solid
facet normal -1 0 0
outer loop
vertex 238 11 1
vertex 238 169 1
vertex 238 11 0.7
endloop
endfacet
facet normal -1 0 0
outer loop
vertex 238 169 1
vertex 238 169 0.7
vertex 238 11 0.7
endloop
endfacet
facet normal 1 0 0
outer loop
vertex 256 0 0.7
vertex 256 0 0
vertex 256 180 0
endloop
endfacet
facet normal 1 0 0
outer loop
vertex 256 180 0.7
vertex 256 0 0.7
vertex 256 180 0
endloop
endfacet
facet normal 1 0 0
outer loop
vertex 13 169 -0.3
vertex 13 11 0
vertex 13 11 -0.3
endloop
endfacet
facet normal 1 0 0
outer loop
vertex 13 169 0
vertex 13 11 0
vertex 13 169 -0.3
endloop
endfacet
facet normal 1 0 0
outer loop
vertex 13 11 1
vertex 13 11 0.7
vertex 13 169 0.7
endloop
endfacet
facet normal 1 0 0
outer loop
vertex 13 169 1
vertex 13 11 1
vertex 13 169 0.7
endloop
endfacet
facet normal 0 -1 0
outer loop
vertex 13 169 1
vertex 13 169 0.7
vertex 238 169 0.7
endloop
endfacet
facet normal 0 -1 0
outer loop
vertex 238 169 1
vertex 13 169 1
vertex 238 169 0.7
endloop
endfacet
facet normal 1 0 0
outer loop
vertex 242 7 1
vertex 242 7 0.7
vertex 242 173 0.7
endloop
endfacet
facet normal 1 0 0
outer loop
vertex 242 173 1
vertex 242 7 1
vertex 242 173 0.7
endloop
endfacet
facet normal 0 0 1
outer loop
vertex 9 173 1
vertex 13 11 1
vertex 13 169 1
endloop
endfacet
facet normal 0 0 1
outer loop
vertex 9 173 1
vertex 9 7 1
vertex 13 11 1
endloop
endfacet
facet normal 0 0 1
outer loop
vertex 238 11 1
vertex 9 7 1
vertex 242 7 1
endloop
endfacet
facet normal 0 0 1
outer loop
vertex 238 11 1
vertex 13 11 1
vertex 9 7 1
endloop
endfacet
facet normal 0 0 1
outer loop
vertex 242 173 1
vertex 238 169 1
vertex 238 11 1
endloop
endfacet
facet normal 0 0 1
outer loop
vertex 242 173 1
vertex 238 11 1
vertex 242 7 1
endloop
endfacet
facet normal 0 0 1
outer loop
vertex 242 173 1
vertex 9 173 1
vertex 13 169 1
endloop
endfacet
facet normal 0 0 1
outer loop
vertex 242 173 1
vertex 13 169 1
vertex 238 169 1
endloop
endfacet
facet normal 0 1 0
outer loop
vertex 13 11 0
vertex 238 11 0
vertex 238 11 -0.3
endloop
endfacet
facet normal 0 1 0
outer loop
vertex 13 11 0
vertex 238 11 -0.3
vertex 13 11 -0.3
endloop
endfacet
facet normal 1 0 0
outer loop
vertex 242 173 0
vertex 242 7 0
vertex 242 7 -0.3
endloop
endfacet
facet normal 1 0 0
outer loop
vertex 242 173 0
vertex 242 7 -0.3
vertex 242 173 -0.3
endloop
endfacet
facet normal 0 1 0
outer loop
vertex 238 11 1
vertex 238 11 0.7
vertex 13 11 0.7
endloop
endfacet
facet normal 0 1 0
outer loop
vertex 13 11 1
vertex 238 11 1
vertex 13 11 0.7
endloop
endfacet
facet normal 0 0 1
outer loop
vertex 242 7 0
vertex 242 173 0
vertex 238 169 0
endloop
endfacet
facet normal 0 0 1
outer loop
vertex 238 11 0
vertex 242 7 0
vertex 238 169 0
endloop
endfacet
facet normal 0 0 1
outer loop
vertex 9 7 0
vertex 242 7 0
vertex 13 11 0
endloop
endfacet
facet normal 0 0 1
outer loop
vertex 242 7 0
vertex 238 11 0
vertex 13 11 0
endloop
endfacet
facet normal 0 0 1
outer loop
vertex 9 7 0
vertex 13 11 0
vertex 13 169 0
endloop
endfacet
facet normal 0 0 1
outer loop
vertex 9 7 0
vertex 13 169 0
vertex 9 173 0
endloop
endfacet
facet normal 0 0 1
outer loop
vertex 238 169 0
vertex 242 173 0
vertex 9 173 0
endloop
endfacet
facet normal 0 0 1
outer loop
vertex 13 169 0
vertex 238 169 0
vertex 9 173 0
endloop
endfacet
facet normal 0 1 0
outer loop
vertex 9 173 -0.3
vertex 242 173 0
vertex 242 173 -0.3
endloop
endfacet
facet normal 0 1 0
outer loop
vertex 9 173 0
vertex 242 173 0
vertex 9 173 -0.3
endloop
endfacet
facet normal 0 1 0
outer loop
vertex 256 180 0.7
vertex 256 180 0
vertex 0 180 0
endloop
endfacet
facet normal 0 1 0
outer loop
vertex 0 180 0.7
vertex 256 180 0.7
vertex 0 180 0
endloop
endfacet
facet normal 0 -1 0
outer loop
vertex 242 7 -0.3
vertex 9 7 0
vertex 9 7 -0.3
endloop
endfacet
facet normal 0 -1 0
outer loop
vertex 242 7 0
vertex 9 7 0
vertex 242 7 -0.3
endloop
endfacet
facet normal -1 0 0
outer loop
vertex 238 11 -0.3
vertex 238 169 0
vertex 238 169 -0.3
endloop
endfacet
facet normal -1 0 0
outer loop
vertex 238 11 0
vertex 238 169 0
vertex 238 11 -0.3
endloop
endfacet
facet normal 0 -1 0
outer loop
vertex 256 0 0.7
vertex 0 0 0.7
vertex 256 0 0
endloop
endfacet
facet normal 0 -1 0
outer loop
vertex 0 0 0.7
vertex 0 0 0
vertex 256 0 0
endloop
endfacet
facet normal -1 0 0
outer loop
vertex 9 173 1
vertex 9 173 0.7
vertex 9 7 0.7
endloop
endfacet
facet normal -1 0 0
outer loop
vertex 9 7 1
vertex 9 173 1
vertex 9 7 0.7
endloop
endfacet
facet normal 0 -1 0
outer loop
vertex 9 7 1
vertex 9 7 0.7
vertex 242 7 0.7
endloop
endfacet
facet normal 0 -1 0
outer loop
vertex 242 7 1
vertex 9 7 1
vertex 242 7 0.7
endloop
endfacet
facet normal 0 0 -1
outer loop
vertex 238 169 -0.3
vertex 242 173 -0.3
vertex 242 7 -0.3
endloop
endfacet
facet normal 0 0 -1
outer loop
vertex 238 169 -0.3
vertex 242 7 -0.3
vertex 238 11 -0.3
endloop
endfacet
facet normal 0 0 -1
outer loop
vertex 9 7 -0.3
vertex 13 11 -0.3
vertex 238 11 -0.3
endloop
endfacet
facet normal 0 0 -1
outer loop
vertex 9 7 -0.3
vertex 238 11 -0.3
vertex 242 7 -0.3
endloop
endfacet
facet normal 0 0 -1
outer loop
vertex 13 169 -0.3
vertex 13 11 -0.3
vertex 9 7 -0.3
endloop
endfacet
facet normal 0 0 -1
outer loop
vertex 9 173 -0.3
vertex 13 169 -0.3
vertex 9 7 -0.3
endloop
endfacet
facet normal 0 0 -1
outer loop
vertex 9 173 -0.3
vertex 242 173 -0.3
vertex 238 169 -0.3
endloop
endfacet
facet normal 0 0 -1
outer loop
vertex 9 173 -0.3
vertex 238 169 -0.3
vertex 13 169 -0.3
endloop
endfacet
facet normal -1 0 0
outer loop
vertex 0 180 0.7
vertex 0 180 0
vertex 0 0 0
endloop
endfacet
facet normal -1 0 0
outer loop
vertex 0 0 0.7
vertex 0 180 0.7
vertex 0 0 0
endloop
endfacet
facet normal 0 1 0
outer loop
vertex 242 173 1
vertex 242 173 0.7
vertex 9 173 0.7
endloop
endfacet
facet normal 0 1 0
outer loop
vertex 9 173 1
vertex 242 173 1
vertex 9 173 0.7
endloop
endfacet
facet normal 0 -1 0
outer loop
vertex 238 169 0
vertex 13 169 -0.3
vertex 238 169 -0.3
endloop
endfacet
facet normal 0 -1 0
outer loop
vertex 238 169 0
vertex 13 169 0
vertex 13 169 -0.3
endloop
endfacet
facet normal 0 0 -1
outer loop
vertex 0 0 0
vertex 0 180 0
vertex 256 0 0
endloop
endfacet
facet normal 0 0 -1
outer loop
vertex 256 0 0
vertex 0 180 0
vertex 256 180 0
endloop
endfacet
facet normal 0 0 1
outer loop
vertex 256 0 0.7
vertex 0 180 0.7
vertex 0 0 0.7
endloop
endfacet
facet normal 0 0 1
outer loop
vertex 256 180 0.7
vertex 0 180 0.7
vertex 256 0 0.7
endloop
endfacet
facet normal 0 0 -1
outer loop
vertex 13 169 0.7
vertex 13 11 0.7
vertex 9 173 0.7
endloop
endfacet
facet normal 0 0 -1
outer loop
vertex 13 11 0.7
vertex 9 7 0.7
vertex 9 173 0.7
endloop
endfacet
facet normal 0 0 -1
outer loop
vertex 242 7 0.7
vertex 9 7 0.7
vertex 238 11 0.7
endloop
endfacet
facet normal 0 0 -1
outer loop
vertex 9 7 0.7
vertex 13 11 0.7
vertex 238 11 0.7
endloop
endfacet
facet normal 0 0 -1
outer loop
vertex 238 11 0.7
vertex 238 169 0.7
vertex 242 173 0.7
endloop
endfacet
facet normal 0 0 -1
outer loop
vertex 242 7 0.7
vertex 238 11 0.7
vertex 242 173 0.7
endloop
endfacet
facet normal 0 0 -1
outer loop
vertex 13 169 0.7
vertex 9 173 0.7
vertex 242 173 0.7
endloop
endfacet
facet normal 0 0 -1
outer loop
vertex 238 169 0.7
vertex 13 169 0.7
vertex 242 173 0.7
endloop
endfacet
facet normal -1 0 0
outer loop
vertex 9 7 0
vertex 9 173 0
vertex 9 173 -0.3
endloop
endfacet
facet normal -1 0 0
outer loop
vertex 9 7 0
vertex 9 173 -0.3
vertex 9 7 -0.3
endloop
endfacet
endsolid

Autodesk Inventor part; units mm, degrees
ref_plane "YZ Plane" through (0, 0, 0) normal (1, 0, 0) x (0, 1, 0)
ref_plane "XZ Plane" through (0, 0, 0) normal (0, 1, 0) x (-1, 0, 0)
ref_plane "XY Plane" through (0, 0, 0) normal (0, 0, 1) x (1, 0, 0)
sketch "Magnifier_Sketch" plane through (0, 0, 0) normal (0, 0, 1) x (1, 0, 0)
  line L0 (0, 0) -> (256, 0)
  line L1 (256, 0) -> (256, 180)
  line L2 (256, 180) -> (0, 180)
  line L3 (0, 180) -> (0, 0)
  dimension "d0" = 180
  dimension "d1" = 256
extrude "Magnifier_Extrusion" add sketch "Magnifier_Sketch" along normal blind 0.7
sketch "FrontLine_Sketch" plane through (0, 0, 0.7) normal (0, 0, 1) x (1, 0, 0)
  line L0 (242, 173) -> (9, 173)
  line L1 (9, 173) -> (9, 7)
  line L2 (9, 7) -> (242, 7)
  line L3 (242, 7) -> (242, 173)
  line L4 (0, 180) -> (0, 0) projected
  line L5 (256, 180) -> (0, 180) projected
  line L6 (256, 0) -> (256, 180) projected
  line L7 (0, 0) -> (256, 0) projected
  line L8 (13, 11) -> (13, 169)
  line L9 (13, 169) -> (238, 169)
  line L10 (238, 169) -> (238, 11)
  line L11 (238, 11) -> (13, 11)
  dimension "d4" = 9
  dimension "d5" = 7
  dimension "d6" = 14
  dimension "d7" = 7
  dimension "d9" = 4
extrude "FrontLine_Extrusion" add sketch "FrontLine_Sketch" along normal blind 0.3 separate body contours L3 L2 L1 L0
sketch "BackLine_Sketch" plane through (0, 0, 0) normal (0, 0, -1) x (-1, 0, 0)
  line L0 (-13, 169) -> (-238, 169) projected
  line L1 (-238, 169) -> (-238, 11) projected
  line L2 (-238, 11) -> (-13, 11) projected
  line L3 (-13, 11) -> (-13, 169) projected
  line L4 (-242, 173) -> (-9, 173) projected
  line L5 (-9, 173) -> (-9, 7) projected
  line L6 (-9, 7) -> (-242, 7) projected
  line L7 (-242, 7) -> (-242, 173) projected
  point P0 (0, 0)
extrude "Extrusion3" add sketch "BackLine_Sketch" along normal blind 0.3 separate body
equation "\"d0\" = magnifier_h"
equation "\"d1\" = magnifier_w"
equation "\"d2\" = magnifier_d"
equation "\"d4\" = magnifier_l"
equation "\"d5\" = magnifier_t"
equation "\"d6\" = magnifier_r"
equation "\"d7\" = magnifier_b"
equation "\"d9\" = magnifier_line_w"
equation "\"d10\" = magnifier_line_d"
equation "\"d12\" = magnifier_line_d"
equation "\"magnifier_w\" = 256"
equation "\"magnifier_h\" = 180"
equation "\"magnifier_d\" = 0.7"
equation "\"magnifier_l\" = 9"
equation "\"magnifier_t\" = 7"
equation "\"magnifier_r\" = 14"
equation "\"magnifier_b\" = 7"
equation "\"magnifier_line_w\" = 4"
equation "\"magnifier_line_d\" = 0.3"
properties part number "magnifier" material "Glass"
